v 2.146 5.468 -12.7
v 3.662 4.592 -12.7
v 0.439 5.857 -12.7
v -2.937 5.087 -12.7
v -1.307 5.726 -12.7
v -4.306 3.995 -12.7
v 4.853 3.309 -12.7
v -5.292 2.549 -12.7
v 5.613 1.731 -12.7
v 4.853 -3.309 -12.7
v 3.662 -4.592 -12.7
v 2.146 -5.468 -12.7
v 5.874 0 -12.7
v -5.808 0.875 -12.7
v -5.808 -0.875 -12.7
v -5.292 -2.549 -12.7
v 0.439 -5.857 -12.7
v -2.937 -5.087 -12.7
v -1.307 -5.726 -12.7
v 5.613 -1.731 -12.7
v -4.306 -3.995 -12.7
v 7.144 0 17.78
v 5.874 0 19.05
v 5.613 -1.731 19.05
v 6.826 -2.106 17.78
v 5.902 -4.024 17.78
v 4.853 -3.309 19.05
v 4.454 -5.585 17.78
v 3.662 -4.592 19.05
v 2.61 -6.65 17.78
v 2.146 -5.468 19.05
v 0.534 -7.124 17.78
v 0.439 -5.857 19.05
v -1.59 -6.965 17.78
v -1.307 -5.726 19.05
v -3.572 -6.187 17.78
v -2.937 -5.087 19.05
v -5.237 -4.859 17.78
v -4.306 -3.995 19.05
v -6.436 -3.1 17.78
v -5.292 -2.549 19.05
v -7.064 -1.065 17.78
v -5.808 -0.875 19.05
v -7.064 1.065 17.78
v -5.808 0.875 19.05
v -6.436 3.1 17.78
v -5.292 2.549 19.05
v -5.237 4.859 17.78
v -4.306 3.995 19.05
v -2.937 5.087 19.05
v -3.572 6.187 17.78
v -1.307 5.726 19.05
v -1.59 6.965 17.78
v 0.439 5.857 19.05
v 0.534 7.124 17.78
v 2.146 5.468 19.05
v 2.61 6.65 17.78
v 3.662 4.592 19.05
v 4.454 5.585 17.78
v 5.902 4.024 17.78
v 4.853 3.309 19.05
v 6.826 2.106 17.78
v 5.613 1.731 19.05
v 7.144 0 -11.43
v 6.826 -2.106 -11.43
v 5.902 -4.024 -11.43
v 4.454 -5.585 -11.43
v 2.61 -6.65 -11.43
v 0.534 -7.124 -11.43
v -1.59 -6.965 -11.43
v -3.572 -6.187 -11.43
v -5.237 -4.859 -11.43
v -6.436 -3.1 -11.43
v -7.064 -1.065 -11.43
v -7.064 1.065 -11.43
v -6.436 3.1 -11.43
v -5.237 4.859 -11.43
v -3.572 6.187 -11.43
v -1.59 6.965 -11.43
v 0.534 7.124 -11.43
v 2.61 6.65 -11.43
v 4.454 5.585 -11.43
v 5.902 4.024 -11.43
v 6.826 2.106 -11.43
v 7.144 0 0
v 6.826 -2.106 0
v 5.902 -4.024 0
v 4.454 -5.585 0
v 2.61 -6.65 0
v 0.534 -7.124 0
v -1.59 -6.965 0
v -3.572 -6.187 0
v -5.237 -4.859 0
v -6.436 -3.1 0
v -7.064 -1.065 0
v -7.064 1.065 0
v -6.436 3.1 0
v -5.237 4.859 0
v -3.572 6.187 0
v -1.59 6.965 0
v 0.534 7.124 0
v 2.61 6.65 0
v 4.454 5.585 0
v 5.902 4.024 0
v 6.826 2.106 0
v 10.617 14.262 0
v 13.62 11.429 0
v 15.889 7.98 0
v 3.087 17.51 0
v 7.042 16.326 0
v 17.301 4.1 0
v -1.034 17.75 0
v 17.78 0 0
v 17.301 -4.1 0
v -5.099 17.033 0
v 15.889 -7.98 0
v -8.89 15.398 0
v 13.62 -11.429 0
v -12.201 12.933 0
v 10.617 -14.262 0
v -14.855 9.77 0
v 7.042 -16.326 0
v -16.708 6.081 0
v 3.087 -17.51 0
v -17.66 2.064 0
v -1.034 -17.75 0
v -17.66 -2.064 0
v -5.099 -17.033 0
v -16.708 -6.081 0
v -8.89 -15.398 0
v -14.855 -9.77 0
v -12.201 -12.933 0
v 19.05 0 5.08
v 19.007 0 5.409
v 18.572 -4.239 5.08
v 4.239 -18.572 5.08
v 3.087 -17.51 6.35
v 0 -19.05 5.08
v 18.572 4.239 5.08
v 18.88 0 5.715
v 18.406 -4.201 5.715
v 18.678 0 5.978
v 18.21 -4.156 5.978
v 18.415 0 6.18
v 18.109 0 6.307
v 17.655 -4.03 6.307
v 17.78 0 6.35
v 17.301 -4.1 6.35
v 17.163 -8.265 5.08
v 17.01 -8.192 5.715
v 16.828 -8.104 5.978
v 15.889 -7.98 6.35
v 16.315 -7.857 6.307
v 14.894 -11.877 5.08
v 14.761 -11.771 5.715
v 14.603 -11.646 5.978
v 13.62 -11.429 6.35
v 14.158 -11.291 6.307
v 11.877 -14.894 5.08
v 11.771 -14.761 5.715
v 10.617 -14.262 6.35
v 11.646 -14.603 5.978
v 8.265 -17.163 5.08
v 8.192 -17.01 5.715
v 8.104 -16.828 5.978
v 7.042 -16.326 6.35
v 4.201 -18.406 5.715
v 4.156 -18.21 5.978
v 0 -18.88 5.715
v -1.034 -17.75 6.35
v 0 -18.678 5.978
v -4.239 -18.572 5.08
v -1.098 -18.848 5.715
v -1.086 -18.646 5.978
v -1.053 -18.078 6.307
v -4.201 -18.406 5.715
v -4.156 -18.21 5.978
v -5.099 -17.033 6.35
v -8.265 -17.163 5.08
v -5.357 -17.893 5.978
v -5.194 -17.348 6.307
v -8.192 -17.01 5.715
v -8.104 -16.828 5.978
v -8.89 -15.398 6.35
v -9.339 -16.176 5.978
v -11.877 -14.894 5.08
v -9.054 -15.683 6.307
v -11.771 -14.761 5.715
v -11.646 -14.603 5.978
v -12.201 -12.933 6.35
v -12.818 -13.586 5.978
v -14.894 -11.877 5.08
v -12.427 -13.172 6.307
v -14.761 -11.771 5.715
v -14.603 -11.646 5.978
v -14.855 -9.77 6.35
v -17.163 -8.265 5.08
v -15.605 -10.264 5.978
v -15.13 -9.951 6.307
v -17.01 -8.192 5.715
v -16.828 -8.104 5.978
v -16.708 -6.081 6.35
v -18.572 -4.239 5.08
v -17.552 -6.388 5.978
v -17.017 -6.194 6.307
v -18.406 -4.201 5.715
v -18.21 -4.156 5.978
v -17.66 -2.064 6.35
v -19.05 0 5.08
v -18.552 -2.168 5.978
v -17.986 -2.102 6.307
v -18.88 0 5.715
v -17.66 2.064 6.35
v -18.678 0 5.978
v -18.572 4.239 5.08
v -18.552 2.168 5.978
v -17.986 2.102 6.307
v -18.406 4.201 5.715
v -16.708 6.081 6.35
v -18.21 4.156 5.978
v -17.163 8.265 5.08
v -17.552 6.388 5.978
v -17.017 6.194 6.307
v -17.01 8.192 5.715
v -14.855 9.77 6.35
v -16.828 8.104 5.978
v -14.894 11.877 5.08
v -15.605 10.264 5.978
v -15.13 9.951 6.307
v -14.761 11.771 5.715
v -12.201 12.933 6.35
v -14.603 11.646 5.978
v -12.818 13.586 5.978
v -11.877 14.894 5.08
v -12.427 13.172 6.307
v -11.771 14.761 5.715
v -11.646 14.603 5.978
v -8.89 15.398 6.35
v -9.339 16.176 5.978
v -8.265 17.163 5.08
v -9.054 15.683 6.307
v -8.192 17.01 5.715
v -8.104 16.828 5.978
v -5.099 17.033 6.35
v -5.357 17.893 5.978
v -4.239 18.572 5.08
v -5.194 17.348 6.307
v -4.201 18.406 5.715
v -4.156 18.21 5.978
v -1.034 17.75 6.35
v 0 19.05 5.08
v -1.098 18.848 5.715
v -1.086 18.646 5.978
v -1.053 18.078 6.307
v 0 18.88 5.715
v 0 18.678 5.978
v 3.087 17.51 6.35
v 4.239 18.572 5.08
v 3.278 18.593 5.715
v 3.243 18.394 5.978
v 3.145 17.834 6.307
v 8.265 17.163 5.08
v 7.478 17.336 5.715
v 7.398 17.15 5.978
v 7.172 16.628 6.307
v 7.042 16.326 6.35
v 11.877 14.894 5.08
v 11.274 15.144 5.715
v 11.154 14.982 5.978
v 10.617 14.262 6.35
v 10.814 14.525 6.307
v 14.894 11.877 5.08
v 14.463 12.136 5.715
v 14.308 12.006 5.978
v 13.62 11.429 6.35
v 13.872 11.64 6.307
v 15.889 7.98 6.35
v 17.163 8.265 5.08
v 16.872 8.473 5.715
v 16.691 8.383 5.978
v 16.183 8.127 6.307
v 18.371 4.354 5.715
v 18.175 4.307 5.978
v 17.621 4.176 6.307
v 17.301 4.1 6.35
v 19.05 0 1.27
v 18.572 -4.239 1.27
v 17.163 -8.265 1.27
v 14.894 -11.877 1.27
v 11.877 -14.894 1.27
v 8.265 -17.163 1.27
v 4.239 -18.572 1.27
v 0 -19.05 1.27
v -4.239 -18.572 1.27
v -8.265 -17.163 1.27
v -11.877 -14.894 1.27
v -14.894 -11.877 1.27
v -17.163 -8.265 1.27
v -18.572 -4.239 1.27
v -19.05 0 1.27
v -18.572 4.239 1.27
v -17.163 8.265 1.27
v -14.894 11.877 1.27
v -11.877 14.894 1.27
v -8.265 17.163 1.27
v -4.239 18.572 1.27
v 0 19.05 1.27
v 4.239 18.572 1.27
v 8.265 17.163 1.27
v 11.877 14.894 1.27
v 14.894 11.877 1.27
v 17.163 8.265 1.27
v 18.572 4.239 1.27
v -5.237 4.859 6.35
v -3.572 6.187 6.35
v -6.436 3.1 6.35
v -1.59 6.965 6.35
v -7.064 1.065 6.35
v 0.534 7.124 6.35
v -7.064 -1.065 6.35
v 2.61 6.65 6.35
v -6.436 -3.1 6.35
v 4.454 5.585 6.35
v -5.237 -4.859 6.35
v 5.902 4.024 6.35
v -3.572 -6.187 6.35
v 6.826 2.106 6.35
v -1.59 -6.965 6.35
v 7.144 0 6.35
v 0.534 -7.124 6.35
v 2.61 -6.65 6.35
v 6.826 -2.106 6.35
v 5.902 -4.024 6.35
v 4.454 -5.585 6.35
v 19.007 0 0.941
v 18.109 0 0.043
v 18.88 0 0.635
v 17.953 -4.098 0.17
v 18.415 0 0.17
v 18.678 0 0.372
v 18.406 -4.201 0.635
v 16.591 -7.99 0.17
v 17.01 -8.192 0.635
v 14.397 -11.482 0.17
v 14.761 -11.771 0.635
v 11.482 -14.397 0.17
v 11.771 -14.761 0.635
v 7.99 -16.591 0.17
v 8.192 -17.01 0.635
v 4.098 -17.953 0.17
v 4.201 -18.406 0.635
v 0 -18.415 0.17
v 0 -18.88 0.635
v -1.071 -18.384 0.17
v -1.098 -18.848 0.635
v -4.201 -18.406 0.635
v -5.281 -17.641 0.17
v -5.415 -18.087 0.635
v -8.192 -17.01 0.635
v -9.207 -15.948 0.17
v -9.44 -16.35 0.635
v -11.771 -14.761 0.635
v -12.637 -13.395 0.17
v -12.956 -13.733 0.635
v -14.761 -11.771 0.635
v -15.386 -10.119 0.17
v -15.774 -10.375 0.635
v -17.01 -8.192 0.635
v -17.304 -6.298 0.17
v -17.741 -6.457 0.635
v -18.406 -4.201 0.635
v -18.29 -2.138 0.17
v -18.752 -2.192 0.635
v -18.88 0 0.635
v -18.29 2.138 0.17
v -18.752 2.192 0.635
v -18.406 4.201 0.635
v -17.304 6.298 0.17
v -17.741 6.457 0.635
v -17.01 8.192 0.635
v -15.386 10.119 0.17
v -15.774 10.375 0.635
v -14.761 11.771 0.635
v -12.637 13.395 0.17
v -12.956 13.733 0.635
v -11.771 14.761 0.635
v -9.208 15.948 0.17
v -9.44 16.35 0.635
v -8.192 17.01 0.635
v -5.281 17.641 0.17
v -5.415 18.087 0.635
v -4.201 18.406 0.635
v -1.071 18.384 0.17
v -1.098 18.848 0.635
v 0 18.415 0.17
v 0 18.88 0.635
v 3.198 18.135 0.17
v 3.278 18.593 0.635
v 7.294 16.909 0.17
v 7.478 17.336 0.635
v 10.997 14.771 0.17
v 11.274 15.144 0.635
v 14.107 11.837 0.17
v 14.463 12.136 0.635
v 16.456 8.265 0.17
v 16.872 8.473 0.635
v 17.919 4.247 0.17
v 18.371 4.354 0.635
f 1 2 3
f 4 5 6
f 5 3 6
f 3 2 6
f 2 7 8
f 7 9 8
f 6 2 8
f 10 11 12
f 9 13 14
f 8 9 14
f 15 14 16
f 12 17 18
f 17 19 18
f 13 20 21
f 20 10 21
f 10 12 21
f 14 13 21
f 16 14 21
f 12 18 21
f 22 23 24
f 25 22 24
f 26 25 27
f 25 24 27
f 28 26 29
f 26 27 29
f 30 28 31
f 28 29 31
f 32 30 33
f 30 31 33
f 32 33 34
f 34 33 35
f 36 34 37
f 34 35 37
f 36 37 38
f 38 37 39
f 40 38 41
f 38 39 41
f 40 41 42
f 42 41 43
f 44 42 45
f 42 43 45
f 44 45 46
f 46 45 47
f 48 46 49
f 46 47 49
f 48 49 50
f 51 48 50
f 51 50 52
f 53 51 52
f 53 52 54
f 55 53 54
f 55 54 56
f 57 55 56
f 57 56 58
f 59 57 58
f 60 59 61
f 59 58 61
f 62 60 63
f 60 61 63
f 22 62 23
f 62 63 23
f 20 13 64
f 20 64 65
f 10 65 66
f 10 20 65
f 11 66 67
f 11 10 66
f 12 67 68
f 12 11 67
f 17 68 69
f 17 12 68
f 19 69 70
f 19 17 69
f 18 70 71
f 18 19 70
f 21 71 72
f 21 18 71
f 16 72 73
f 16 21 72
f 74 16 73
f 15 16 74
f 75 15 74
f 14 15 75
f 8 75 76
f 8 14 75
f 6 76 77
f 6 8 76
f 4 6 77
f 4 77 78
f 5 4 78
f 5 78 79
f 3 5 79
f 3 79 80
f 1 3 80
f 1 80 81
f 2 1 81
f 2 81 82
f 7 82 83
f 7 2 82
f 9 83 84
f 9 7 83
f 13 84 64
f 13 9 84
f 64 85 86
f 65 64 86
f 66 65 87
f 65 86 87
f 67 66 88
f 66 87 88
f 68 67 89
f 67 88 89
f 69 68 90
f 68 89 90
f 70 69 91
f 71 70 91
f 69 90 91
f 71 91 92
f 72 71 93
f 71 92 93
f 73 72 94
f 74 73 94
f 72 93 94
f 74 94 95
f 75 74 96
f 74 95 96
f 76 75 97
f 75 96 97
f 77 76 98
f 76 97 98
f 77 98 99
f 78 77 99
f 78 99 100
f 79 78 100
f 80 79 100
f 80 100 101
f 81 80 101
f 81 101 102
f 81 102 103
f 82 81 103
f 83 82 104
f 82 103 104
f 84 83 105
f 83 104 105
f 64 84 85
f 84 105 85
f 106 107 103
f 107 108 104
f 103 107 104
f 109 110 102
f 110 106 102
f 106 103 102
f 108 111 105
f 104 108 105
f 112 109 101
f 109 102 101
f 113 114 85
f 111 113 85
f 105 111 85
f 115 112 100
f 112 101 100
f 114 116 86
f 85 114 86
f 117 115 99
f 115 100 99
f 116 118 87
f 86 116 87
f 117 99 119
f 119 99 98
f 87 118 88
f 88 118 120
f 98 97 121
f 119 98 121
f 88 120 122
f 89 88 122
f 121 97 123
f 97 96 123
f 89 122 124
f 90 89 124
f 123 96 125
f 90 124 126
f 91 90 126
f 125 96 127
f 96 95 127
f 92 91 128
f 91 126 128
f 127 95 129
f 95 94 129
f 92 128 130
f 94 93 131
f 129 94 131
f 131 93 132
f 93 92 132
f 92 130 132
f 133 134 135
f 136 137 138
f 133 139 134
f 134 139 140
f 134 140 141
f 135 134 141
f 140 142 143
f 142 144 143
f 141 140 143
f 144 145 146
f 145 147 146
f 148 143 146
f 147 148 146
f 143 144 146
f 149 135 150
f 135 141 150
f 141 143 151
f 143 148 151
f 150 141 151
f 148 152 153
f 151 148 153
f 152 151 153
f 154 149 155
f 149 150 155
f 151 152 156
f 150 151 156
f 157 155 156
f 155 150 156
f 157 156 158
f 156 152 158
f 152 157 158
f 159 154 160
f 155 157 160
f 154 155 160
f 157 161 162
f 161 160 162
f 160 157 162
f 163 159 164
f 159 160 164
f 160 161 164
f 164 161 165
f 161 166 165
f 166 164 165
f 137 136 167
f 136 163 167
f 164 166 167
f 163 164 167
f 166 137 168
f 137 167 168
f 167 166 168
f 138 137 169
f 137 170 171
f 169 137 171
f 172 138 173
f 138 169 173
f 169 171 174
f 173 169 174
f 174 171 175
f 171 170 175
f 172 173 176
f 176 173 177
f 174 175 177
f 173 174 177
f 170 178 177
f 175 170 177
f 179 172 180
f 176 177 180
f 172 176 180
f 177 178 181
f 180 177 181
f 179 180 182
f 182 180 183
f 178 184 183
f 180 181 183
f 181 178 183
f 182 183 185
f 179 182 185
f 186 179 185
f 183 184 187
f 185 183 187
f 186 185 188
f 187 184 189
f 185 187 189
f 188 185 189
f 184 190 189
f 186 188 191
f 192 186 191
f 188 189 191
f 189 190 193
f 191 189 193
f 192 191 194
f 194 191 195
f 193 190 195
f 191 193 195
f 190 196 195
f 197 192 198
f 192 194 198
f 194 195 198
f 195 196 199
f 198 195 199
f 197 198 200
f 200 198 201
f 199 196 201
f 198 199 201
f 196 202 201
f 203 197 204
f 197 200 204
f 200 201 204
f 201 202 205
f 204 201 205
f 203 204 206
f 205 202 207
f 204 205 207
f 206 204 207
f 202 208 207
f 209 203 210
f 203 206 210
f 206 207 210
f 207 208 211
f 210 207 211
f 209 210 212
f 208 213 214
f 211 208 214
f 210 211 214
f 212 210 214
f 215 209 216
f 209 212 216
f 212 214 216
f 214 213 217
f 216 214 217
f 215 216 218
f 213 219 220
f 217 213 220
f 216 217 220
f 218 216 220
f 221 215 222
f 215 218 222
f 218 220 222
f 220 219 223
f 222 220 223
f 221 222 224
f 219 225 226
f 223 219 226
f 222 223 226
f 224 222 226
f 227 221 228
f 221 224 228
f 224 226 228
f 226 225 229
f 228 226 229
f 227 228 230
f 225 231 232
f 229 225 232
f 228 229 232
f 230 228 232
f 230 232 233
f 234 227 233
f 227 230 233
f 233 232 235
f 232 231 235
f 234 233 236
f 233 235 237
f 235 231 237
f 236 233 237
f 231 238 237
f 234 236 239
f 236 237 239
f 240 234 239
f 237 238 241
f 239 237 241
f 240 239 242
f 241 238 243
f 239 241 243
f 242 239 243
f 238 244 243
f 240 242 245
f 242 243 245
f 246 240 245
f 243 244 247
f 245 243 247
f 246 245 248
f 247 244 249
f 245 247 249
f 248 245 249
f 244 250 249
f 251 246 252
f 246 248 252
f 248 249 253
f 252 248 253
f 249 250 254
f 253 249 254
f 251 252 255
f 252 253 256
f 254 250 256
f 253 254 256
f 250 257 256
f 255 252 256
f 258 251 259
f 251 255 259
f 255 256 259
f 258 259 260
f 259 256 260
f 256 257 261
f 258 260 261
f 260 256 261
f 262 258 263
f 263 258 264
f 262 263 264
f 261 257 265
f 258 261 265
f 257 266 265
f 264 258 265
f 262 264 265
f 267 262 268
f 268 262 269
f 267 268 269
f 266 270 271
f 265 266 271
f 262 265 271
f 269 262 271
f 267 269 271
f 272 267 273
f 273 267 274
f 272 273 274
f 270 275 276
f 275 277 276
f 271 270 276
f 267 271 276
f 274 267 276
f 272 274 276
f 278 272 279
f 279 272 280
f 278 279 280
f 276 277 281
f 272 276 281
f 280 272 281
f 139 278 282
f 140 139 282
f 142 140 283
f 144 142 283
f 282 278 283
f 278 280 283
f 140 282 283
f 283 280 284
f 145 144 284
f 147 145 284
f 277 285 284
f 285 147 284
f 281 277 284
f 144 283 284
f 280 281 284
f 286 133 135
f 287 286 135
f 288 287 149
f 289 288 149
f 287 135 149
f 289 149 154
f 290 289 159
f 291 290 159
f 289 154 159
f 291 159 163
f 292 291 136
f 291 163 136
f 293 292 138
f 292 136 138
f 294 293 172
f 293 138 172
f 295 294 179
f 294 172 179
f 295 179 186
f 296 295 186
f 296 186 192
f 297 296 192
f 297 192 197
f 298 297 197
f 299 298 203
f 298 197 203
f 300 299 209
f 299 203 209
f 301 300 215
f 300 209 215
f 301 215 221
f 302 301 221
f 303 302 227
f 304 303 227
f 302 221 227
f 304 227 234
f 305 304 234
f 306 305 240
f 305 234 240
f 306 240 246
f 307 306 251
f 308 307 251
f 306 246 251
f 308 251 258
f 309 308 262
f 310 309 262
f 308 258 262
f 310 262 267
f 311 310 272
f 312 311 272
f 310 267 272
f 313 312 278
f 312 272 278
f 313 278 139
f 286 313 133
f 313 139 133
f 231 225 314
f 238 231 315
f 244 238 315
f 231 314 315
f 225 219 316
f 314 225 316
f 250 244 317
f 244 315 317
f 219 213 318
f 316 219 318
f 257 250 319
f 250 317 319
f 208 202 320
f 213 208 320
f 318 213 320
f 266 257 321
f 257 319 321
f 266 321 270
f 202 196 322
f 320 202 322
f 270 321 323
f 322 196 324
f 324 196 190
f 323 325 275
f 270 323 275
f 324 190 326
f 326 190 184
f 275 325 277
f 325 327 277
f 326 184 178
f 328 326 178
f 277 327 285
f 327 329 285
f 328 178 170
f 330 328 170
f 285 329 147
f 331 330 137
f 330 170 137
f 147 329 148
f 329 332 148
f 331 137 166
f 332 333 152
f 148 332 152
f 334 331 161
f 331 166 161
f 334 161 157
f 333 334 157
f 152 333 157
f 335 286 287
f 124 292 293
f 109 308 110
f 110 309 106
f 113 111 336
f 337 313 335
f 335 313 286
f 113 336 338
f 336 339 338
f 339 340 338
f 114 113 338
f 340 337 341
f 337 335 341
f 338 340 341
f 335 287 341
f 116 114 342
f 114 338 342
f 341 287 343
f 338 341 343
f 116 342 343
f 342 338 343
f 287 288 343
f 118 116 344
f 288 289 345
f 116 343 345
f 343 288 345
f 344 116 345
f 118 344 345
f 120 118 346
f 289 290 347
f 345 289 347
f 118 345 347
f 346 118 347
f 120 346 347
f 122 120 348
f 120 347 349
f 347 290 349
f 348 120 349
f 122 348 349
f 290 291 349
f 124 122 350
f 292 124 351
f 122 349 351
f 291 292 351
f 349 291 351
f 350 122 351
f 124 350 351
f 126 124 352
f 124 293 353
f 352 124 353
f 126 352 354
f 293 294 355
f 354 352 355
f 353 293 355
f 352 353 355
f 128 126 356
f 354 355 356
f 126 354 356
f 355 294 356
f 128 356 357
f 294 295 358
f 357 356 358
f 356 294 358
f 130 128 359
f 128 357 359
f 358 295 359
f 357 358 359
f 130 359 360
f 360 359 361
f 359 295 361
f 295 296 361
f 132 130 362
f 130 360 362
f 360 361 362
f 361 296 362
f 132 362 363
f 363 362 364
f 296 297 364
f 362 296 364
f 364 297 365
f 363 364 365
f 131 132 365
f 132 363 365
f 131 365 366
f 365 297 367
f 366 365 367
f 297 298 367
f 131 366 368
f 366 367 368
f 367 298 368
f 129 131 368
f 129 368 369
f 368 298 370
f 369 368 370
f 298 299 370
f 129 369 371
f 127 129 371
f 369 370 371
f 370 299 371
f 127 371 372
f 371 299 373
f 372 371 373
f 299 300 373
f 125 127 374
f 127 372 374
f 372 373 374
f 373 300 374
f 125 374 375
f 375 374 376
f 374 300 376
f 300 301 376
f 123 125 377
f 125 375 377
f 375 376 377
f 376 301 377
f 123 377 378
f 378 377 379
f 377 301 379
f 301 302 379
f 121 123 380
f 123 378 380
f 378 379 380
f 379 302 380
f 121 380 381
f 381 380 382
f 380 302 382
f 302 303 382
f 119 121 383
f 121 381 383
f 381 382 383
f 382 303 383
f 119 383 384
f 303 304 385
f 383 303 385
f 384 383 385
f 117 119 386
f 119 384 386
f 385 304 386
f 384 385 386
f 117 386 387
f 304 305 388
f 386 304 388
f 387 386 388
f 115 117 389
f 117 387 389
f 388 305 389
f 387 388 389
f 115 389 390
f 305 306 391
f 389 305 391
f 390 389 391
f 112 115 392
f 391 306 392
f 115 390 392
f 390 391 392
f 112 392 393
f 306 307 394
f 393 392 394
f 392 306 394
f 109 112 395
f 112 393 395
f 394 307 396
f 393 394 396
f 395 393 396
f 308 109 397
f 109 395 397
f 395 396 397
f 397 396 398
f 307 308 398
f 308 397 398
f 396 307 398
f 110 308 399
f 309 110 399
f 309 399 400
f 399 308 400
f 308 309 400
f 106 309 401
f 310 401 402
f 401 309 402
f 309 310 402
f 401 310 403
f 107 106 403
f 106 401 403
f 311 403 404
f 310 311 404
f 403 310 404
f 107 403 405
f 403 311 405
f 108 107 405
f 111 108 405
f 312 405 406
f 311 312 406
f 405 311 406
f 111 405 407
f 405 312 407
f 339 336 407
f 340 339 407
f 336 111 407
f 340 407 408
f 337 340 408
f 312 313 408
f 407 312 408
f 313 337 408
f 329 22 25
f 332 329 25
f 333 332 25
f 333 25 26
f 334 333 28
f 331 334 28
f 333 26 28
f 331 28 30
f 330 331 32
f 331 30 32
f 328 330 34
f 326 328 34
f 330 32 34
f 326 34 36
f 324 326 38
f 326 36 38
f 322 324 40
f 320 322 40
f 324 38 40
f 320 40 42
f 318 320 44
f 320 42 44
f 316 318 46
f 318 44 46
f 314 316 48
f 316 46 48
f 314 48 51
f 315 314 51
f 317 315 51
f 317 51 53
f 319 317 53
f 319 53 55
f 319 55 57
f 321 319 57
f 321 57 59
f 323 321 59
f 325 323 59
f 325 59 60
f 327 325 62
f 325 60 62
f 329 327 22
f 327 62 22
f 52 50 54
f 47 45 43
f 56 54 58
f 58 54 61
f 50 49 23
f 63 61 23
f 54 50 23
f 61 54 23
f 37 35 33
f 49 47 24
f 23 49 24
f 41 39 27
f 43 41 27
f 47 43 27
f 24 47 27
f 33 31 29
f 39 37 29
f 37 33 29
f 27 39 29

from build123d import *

# Parameters (mm, degrees)
F2_R    = 1.27
F3_SIZE = 1.27


with BuildPart() as f1:
    # F0 (on Front) → F1 (revolve)
    with BuildSketch(Plane.XZ):
        Polygon((7.14375, 19.05), (0, 19.05), (0, -12.7), (7.14375, -12.7), (7.14375, 0), (19.05, 0), (19.05, 6.35), (7.14375, 6.35), align=None)
    revolve(axis=Axis((0, 0, 3.175), (0, 0, -1)))

    # F2
    f2_edges = [f1.edges().sort_by_distance(p)[0] for p in [
        (-19.05, 0, 6.35),
        (-19.05, 0, 0),
    ]]
    fillet(f2_edges, radius=F2_R)

    # F3
    f3_edges = [f1.edges().sort_by_distance(p)[0] for p in [
        (-7.14375, 0, 19.05),
        (-7.14375, 0, -12.7),
    ]]
    chamfer(f3_edges, length=F3_SIZE)


solid = f1.part
